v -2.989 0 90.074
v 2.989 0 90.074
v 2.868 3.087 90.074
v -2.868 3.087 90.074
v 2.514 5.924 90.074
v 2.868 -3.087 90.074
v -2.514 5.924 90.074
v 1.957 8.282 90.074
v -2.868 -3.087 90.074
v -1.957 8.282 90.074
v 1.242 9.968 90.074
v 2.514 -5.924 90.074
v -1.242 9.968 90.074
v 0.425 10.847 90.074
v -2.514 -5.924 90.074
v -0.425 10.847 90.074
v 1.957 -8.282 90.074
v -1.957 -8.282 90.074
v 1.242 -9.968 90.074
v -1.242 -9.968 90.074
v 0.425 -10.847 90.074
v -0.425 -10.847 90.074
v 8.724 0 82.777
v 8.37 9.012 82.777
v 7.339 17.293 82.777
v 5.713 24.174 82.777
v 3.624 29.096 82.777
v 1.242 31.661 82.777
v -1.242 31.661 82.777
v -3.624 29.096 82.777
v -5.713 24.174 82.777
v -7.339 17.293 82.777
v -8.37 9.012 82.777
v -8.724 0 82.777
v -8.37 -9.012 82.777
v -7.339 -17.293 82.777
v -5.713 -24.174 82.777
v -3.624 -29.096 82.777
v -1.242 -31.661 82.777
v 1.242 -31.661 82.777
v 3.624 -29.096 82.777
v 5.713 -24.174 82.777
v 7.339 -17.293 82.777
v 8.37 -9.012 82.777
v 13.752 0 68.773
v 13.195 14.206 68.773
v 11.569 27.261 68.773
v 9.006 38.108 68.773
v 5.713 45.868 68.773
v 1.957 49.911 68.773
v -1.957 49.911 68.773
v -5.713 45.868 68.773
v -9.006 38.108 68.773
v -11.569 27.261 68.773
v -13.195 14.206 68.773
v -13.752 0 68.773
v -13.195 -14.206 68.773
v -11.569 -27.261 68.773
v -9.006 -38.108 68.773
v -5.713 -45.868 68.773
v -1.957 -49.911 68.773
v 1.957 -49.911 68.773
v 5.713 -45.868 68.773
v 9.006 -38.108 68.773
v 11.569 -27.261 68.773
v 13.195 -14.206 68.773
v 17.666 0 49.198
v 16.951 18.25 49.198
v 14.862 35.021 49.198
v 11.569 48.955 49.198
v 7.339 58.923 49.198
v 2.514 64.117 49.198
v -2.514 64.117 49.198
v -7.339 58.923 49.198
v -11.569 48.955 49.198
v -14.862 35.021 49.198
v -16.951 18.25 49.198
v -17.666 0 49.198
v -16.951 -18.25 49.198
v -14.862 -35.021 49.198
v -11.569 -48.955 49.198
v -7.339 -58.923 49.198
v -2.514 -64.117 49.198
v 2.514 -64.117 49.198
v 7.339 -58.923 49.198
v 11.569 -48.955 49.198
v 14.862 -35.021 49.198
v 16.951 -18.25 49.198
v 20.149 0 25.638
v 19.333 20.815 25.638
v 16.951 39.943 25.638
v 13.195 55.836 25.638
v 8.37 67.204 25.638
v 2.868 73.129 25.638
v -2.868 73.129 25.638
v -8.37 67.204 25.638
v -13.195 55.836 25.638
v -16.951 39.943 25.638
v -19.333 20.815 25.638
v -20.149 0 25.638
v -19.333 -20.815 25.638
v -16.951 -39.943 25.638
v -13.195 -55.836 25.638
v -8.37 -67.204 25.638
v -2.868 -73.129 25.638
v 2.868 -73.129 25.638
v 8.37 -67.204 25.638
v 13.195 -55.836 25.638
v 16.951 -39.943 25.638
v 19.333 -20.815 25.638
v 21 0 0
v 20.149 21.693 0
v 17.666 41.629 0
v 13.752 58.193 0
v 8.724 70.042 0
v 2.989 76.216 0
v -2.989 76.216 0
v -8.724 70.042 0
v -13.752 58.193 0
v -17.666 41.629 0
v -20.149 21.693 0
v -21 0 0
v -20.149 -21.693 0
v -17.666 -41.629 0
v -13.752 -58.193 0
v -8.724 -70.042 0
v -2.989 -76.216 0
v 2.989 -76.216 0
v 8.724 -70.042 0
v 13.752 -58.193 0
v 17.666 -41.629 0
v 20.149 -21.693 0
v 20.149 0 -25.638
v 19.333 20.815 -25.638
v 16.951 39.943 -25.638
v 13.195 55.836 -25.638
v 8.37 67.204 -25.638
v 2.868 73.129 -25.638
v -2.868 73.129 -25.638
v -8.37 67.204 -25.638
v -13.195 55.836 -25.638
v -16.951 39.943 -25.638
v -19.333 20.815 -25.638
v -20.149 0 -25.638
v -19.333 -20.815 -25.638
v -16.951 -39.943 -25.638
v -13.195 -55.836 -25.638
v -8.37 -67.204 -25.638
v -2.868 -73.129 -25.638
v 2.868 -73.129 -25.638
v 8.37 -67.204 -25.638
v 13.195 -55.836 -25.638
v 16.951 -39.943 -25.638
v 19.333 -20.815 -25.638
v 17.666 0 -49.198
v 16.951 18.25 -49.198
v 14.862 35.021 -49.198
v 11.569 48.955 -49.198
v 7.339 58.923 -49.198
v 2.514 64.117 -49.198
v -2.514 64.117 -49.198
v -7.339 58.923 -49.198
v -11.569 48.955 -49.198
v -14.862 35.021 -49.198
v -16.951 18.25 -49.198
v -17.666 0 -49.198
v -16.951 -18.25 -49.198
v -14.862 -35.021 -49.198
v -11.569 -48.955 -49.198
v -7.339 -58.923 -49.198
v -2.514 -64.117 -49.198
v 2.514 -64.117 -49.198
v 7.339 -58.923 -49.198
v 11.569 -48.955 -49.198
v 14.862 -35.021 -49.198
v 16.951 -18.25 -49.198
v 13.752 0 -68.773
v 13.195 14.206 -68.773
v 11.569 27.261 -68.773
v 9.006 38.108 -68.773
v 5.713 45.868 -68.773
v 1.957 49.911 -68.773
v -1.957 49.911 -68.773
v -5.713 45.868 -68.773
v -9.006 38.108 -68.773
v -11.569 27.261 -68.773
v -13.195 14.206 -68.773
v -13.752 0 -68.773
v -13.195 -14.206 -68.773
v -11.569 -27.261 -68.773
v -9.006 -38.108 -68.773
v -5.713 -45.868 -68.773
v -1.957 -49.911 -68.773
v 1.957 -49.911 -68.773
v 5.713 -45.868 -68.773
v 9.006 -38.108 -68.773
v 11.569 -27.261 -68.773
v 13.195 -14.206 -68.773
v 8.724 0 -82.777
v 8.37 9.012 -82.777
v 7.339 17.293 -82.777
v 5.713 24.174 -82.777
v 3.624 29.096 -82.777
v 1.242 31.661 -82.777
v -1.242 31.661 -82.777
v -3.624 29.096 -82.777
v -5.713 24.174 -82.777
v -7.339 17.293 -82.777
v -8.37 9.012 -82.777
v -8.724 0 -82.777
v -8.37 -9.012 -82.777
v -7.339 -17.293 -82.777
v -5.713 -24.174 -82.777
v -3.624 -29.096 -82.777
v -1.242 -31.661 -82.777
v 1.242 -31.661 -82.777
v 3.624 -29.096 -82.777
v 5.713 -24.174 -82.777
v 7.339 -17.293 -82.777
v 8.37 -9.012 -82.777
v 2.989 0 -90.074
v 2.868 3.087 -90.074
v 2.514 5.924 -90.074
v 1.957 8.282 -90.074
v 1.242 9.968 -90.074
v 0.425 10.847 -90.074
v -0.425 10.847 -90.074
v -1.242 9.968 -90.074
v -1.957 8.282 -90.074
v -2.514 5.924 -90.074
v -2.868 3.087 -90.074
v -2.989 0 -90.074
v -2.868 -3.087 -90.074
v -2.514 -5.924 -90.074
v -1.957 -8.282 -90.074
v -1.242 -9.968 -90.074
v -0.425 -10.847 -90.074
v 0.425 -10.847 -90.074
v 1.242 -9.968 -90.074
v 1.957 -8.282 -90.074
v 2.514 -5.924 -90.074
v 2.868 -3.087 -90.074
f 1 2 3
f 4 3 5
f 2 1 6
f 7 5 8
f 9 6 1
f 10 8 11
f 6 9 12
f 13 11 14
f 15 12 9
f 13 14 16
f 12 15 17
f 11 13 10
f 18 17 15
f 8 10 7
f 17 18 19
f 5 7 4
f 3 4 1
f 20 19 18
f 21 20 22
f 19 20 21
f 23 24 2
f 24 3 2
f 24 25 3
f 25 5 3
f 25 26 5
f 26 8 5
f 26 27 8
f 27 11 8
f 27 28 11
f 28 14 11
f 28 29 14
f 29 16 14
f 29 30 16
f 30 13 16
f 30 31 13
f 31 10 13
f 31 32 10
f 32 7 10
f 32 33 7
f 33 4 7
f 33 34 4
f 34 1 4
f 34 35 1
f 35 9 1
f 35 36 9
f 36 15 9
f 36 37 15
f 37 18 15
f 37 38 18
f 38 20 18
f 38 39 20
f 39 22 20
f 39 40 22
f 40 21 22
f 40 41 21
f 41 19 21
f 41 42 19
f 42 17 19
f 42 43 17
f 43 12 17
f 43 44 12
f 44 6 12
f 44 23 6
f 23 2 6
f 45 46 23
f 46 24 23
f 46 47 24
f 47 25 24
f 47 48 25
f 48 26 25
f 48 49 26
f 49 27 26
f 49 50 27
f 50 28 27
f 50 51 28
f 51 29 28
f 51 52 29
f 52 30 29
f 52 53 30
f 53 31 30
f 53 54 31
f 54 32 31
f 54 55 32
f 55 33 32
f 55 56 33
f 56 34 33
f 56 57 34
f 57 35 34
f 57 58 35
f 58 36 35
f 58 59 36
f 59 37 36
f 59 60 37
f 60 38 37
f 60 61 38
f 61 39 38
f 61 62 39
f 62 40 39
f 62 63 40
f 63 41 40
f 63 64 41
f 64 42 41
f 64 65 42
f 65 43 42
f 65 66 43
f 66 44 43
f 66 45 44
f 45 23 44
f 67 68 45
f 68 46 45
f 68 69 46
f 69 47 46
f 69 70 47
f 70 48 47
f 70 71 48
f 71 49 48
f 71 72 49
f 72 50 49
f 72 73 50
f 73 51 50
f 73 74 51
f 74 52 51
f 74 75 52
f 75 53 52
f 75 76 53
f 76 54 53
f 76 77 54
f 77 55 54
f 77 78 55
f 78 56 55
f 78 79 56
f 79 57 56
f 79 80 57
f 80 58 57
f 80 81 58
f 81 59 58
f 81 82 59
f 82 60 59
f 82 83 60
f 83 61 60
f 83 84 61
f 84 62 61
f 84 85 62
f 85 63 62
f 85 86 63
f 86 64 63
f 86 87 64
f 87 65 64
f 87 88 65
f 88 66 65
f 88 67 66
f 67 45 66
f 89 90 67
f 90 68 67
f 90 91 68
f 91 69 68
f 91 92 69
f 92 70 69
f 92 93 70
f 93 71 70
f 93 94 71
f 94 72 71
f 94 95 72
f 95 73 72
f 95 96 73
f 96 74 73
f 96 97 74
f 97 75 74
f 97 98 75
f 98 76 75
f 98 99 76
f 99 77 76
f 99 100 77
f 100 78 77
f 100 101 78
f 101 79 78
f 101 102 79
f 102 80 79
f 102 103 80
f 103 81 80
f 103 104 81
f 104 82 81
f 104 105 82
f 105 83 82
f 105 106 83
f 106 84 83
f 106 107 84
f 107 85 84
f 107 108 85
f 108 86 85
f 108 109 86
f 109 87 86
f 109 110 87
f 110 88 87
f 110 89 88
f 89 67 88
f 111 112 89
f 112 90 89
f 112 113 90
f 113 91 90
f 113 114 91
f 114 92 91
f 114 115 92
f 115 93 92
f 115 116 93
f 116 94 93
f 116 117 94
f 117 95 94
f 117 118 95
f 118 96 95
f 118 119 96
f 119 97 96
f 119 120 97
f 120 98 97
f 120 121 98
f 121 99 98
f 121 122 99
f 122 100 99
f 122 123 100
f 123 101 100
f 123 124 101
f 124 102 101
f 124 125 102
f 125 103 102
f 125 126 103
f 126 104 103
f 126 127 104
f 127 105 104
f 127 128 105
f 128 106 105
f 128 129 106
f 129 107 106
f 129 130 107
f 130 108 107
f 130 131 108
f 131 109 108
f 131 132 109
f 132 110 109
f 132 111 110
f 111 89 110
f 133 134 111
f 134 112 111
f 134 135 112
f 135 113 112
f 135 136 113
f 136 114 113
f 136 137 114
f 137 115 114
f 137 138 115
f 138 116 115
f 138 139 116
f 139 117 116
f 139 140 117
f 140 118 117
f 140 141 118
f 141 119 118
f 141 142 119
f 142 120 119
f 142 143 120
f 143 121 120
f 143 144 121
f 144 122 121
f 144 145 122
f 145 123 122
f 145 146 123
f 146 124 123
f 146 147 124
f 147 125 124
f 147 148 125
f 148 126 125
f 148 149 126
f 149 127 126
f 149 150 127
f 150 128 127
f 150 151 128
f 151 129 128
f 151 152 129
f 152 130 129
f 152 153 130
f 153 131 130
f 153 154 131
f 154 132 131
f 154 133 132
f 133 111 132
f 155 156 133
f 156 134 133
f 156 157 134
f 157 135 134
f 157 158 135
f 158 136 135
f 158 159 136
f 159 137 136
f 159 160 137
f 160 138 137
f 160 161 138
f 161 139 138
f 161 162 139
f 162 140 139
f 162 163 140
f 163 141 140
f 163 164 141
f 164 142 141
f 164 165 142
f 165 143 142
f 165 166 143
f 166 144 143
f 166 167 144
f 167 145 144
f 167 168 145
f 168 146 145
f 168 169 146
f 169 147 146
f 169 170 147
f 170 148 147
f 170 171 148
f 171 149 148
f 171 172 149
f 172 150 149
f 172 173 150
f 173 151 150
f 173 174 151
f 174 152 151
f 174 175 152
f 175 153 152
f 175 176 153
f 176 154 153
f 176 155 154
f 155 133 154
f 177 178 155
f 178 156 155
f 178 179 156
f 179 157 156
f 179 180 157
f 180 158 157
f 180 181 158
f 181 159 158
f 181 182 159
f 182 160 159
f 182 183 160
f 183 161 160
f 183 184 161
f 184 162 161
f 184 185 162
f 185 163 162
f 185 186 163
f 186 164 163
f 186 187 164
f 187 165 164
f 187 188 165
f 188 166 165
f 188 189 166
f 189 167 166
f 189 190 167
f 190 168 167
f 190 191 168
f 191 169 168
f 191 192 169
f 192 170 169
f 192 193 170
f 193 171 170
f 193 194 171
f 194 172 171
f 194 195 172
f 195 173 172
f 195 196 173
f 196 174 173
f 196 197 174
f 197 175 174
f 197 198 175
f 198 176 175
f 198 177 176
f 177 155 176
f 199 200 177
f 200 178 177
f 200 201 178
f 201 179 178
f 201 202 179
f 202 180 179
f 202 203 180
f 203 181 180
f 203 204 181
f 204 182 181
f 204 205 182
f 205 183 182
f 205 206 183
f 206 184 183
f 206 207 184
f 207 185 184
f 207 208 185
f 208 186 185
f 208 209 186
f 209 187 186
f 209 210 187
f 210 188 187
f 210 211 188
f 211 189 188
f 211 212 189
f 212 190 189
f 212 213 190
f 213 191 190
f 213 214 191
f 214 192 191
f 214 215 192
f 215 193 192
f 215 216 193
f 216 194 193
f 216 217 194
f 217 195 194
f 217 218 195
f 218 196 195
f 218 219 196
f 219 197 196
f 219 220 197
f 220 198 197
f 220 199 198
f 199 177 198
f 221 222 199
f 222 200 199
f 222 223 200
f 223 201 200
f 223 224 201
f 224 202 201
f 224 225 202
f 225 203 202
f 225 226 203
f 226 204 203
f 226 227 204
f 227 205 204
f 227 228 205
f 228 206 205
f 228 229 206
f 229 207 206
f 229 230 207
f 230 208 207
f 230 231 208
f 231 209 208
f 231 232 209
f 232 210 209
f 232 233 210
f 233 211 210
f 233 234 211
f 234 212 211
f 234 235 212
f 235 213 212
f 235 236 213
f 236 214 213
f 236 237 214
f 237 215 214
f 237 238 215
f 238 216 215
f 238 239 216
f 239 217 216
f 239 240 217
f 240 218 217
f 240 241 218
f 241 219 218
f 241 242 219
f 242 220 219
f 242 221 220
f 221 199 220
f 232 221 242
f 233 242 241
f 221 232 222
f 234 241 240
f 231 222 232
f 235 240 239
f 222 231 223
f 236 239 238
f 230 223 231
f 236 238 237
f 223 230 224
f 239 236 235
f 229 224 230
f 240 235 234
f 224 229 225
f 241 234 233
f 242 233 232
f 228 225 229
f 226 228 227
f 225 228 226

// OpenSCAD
// Generated by SolidPython 1.0.1 on 2020-07-29 00:46:45


scale(v = [3, 11, 13]) {
	sphere(r = 7);
}
/***********************************************
*********      SolidPython code:      **********
************************************************
 
# import packages: SolidPython
from solid import *
from solid.utils import *
from itertools import chain, combinations, permutations


class Resize:

    def __init__(self, scad_file):
        self.scad_file = scad_file
        #self.scad_file = import_scad(scad_file)
        # cone/cylinder param:
        self.r1 = 0
        self.r2 = 0
        self.h = 0
        # rectangular prism param:
        self.w = 0
        self.l = 0
        # ellipse param:
        self.r = 0

    # import OpenScad code (file name corresponds to shape)


    # classify shape + parameters
    def assign(self, param1, param2, param3):
        if self.scad_file == 'cone.scad':
            self.r1 = param1
            self.r2 = param2
            self.h = param3
        elif self.scad_file == 'cylinder.scad':
            self.r1 = param1
            self.r2 = param2
            self.h = param3
        elif self.scad_file == 'rectangularPrism.scad':
            self.h = param1
            self.l = param2
            self.w = param3
        else:
            self.r = param1
            self.h = param2

    # resize parameters
    def iterate(self):
        x = range(3, 20, 2)
        i = 1
        if self.scad_file == 'cone.scad':
            tempList = list(permutations(x, 2))
            for temp in tempList:
                param1 = temp[0]
                param2 = temp[1]
                filepath = 'produced_scad_files/' + 'cone' + str(param1) + '_' + str(param2) + '_' + '.scad'
                scad_render_to_file(cylinder(h=param1, r1=param2, r2=0), filepath)

        elif self.scad_file == 'cylinder.scad':
            tempList = list(permutations(x, 3))
            for temp in tempList:
                param1 = temp[0]
                param2 = temp[1]
                filepath = 'produced_scad_files/' + 'cylinder' + str(param1) + '_' + str(param2) + '_' + '.scad'
                scad_render_to_file(cylinder(h=param1, r1=param2, r2=param2), filepath)

        elif self.scad_file == 'rectangularPrism.scad':
            tempList = list(permutations(x, 3))
            for temp in tempList:
                param1 = temp[0]
                param2 = temp[1]
                param3 = temp[2]
                filepath = 'produced_scad_files/' + 'rectangularPrism' + str(param1) + '_' + str(param2) + '_' + str(
                    param3) + '.scad'
                scad_render_to_file(cube(size=(param1, param2, param3)), filepath)

        elif self.scad_file == 'ellipse.scad':
            tempList = list(permutations(x, 4))
            for temp in tempList:
                param1 = temp[0]
                param2 = temp[1]
                param3 = temp[2]
                param4 = temp[3]
                filepath = 'produced_scad_files/' + 'ellipse' + str(param1) + '_' + str(param2) + '_' + str(param3) + '_' + str(param4) + '.scad'
                scad_render_to_file(scale([param1, param2, param3])(sphere(r=param4)), filepath)

    def render_to_scadfile(self):
        scad_render_to_file(scad, 'example.scad') 
 
************************************************/
